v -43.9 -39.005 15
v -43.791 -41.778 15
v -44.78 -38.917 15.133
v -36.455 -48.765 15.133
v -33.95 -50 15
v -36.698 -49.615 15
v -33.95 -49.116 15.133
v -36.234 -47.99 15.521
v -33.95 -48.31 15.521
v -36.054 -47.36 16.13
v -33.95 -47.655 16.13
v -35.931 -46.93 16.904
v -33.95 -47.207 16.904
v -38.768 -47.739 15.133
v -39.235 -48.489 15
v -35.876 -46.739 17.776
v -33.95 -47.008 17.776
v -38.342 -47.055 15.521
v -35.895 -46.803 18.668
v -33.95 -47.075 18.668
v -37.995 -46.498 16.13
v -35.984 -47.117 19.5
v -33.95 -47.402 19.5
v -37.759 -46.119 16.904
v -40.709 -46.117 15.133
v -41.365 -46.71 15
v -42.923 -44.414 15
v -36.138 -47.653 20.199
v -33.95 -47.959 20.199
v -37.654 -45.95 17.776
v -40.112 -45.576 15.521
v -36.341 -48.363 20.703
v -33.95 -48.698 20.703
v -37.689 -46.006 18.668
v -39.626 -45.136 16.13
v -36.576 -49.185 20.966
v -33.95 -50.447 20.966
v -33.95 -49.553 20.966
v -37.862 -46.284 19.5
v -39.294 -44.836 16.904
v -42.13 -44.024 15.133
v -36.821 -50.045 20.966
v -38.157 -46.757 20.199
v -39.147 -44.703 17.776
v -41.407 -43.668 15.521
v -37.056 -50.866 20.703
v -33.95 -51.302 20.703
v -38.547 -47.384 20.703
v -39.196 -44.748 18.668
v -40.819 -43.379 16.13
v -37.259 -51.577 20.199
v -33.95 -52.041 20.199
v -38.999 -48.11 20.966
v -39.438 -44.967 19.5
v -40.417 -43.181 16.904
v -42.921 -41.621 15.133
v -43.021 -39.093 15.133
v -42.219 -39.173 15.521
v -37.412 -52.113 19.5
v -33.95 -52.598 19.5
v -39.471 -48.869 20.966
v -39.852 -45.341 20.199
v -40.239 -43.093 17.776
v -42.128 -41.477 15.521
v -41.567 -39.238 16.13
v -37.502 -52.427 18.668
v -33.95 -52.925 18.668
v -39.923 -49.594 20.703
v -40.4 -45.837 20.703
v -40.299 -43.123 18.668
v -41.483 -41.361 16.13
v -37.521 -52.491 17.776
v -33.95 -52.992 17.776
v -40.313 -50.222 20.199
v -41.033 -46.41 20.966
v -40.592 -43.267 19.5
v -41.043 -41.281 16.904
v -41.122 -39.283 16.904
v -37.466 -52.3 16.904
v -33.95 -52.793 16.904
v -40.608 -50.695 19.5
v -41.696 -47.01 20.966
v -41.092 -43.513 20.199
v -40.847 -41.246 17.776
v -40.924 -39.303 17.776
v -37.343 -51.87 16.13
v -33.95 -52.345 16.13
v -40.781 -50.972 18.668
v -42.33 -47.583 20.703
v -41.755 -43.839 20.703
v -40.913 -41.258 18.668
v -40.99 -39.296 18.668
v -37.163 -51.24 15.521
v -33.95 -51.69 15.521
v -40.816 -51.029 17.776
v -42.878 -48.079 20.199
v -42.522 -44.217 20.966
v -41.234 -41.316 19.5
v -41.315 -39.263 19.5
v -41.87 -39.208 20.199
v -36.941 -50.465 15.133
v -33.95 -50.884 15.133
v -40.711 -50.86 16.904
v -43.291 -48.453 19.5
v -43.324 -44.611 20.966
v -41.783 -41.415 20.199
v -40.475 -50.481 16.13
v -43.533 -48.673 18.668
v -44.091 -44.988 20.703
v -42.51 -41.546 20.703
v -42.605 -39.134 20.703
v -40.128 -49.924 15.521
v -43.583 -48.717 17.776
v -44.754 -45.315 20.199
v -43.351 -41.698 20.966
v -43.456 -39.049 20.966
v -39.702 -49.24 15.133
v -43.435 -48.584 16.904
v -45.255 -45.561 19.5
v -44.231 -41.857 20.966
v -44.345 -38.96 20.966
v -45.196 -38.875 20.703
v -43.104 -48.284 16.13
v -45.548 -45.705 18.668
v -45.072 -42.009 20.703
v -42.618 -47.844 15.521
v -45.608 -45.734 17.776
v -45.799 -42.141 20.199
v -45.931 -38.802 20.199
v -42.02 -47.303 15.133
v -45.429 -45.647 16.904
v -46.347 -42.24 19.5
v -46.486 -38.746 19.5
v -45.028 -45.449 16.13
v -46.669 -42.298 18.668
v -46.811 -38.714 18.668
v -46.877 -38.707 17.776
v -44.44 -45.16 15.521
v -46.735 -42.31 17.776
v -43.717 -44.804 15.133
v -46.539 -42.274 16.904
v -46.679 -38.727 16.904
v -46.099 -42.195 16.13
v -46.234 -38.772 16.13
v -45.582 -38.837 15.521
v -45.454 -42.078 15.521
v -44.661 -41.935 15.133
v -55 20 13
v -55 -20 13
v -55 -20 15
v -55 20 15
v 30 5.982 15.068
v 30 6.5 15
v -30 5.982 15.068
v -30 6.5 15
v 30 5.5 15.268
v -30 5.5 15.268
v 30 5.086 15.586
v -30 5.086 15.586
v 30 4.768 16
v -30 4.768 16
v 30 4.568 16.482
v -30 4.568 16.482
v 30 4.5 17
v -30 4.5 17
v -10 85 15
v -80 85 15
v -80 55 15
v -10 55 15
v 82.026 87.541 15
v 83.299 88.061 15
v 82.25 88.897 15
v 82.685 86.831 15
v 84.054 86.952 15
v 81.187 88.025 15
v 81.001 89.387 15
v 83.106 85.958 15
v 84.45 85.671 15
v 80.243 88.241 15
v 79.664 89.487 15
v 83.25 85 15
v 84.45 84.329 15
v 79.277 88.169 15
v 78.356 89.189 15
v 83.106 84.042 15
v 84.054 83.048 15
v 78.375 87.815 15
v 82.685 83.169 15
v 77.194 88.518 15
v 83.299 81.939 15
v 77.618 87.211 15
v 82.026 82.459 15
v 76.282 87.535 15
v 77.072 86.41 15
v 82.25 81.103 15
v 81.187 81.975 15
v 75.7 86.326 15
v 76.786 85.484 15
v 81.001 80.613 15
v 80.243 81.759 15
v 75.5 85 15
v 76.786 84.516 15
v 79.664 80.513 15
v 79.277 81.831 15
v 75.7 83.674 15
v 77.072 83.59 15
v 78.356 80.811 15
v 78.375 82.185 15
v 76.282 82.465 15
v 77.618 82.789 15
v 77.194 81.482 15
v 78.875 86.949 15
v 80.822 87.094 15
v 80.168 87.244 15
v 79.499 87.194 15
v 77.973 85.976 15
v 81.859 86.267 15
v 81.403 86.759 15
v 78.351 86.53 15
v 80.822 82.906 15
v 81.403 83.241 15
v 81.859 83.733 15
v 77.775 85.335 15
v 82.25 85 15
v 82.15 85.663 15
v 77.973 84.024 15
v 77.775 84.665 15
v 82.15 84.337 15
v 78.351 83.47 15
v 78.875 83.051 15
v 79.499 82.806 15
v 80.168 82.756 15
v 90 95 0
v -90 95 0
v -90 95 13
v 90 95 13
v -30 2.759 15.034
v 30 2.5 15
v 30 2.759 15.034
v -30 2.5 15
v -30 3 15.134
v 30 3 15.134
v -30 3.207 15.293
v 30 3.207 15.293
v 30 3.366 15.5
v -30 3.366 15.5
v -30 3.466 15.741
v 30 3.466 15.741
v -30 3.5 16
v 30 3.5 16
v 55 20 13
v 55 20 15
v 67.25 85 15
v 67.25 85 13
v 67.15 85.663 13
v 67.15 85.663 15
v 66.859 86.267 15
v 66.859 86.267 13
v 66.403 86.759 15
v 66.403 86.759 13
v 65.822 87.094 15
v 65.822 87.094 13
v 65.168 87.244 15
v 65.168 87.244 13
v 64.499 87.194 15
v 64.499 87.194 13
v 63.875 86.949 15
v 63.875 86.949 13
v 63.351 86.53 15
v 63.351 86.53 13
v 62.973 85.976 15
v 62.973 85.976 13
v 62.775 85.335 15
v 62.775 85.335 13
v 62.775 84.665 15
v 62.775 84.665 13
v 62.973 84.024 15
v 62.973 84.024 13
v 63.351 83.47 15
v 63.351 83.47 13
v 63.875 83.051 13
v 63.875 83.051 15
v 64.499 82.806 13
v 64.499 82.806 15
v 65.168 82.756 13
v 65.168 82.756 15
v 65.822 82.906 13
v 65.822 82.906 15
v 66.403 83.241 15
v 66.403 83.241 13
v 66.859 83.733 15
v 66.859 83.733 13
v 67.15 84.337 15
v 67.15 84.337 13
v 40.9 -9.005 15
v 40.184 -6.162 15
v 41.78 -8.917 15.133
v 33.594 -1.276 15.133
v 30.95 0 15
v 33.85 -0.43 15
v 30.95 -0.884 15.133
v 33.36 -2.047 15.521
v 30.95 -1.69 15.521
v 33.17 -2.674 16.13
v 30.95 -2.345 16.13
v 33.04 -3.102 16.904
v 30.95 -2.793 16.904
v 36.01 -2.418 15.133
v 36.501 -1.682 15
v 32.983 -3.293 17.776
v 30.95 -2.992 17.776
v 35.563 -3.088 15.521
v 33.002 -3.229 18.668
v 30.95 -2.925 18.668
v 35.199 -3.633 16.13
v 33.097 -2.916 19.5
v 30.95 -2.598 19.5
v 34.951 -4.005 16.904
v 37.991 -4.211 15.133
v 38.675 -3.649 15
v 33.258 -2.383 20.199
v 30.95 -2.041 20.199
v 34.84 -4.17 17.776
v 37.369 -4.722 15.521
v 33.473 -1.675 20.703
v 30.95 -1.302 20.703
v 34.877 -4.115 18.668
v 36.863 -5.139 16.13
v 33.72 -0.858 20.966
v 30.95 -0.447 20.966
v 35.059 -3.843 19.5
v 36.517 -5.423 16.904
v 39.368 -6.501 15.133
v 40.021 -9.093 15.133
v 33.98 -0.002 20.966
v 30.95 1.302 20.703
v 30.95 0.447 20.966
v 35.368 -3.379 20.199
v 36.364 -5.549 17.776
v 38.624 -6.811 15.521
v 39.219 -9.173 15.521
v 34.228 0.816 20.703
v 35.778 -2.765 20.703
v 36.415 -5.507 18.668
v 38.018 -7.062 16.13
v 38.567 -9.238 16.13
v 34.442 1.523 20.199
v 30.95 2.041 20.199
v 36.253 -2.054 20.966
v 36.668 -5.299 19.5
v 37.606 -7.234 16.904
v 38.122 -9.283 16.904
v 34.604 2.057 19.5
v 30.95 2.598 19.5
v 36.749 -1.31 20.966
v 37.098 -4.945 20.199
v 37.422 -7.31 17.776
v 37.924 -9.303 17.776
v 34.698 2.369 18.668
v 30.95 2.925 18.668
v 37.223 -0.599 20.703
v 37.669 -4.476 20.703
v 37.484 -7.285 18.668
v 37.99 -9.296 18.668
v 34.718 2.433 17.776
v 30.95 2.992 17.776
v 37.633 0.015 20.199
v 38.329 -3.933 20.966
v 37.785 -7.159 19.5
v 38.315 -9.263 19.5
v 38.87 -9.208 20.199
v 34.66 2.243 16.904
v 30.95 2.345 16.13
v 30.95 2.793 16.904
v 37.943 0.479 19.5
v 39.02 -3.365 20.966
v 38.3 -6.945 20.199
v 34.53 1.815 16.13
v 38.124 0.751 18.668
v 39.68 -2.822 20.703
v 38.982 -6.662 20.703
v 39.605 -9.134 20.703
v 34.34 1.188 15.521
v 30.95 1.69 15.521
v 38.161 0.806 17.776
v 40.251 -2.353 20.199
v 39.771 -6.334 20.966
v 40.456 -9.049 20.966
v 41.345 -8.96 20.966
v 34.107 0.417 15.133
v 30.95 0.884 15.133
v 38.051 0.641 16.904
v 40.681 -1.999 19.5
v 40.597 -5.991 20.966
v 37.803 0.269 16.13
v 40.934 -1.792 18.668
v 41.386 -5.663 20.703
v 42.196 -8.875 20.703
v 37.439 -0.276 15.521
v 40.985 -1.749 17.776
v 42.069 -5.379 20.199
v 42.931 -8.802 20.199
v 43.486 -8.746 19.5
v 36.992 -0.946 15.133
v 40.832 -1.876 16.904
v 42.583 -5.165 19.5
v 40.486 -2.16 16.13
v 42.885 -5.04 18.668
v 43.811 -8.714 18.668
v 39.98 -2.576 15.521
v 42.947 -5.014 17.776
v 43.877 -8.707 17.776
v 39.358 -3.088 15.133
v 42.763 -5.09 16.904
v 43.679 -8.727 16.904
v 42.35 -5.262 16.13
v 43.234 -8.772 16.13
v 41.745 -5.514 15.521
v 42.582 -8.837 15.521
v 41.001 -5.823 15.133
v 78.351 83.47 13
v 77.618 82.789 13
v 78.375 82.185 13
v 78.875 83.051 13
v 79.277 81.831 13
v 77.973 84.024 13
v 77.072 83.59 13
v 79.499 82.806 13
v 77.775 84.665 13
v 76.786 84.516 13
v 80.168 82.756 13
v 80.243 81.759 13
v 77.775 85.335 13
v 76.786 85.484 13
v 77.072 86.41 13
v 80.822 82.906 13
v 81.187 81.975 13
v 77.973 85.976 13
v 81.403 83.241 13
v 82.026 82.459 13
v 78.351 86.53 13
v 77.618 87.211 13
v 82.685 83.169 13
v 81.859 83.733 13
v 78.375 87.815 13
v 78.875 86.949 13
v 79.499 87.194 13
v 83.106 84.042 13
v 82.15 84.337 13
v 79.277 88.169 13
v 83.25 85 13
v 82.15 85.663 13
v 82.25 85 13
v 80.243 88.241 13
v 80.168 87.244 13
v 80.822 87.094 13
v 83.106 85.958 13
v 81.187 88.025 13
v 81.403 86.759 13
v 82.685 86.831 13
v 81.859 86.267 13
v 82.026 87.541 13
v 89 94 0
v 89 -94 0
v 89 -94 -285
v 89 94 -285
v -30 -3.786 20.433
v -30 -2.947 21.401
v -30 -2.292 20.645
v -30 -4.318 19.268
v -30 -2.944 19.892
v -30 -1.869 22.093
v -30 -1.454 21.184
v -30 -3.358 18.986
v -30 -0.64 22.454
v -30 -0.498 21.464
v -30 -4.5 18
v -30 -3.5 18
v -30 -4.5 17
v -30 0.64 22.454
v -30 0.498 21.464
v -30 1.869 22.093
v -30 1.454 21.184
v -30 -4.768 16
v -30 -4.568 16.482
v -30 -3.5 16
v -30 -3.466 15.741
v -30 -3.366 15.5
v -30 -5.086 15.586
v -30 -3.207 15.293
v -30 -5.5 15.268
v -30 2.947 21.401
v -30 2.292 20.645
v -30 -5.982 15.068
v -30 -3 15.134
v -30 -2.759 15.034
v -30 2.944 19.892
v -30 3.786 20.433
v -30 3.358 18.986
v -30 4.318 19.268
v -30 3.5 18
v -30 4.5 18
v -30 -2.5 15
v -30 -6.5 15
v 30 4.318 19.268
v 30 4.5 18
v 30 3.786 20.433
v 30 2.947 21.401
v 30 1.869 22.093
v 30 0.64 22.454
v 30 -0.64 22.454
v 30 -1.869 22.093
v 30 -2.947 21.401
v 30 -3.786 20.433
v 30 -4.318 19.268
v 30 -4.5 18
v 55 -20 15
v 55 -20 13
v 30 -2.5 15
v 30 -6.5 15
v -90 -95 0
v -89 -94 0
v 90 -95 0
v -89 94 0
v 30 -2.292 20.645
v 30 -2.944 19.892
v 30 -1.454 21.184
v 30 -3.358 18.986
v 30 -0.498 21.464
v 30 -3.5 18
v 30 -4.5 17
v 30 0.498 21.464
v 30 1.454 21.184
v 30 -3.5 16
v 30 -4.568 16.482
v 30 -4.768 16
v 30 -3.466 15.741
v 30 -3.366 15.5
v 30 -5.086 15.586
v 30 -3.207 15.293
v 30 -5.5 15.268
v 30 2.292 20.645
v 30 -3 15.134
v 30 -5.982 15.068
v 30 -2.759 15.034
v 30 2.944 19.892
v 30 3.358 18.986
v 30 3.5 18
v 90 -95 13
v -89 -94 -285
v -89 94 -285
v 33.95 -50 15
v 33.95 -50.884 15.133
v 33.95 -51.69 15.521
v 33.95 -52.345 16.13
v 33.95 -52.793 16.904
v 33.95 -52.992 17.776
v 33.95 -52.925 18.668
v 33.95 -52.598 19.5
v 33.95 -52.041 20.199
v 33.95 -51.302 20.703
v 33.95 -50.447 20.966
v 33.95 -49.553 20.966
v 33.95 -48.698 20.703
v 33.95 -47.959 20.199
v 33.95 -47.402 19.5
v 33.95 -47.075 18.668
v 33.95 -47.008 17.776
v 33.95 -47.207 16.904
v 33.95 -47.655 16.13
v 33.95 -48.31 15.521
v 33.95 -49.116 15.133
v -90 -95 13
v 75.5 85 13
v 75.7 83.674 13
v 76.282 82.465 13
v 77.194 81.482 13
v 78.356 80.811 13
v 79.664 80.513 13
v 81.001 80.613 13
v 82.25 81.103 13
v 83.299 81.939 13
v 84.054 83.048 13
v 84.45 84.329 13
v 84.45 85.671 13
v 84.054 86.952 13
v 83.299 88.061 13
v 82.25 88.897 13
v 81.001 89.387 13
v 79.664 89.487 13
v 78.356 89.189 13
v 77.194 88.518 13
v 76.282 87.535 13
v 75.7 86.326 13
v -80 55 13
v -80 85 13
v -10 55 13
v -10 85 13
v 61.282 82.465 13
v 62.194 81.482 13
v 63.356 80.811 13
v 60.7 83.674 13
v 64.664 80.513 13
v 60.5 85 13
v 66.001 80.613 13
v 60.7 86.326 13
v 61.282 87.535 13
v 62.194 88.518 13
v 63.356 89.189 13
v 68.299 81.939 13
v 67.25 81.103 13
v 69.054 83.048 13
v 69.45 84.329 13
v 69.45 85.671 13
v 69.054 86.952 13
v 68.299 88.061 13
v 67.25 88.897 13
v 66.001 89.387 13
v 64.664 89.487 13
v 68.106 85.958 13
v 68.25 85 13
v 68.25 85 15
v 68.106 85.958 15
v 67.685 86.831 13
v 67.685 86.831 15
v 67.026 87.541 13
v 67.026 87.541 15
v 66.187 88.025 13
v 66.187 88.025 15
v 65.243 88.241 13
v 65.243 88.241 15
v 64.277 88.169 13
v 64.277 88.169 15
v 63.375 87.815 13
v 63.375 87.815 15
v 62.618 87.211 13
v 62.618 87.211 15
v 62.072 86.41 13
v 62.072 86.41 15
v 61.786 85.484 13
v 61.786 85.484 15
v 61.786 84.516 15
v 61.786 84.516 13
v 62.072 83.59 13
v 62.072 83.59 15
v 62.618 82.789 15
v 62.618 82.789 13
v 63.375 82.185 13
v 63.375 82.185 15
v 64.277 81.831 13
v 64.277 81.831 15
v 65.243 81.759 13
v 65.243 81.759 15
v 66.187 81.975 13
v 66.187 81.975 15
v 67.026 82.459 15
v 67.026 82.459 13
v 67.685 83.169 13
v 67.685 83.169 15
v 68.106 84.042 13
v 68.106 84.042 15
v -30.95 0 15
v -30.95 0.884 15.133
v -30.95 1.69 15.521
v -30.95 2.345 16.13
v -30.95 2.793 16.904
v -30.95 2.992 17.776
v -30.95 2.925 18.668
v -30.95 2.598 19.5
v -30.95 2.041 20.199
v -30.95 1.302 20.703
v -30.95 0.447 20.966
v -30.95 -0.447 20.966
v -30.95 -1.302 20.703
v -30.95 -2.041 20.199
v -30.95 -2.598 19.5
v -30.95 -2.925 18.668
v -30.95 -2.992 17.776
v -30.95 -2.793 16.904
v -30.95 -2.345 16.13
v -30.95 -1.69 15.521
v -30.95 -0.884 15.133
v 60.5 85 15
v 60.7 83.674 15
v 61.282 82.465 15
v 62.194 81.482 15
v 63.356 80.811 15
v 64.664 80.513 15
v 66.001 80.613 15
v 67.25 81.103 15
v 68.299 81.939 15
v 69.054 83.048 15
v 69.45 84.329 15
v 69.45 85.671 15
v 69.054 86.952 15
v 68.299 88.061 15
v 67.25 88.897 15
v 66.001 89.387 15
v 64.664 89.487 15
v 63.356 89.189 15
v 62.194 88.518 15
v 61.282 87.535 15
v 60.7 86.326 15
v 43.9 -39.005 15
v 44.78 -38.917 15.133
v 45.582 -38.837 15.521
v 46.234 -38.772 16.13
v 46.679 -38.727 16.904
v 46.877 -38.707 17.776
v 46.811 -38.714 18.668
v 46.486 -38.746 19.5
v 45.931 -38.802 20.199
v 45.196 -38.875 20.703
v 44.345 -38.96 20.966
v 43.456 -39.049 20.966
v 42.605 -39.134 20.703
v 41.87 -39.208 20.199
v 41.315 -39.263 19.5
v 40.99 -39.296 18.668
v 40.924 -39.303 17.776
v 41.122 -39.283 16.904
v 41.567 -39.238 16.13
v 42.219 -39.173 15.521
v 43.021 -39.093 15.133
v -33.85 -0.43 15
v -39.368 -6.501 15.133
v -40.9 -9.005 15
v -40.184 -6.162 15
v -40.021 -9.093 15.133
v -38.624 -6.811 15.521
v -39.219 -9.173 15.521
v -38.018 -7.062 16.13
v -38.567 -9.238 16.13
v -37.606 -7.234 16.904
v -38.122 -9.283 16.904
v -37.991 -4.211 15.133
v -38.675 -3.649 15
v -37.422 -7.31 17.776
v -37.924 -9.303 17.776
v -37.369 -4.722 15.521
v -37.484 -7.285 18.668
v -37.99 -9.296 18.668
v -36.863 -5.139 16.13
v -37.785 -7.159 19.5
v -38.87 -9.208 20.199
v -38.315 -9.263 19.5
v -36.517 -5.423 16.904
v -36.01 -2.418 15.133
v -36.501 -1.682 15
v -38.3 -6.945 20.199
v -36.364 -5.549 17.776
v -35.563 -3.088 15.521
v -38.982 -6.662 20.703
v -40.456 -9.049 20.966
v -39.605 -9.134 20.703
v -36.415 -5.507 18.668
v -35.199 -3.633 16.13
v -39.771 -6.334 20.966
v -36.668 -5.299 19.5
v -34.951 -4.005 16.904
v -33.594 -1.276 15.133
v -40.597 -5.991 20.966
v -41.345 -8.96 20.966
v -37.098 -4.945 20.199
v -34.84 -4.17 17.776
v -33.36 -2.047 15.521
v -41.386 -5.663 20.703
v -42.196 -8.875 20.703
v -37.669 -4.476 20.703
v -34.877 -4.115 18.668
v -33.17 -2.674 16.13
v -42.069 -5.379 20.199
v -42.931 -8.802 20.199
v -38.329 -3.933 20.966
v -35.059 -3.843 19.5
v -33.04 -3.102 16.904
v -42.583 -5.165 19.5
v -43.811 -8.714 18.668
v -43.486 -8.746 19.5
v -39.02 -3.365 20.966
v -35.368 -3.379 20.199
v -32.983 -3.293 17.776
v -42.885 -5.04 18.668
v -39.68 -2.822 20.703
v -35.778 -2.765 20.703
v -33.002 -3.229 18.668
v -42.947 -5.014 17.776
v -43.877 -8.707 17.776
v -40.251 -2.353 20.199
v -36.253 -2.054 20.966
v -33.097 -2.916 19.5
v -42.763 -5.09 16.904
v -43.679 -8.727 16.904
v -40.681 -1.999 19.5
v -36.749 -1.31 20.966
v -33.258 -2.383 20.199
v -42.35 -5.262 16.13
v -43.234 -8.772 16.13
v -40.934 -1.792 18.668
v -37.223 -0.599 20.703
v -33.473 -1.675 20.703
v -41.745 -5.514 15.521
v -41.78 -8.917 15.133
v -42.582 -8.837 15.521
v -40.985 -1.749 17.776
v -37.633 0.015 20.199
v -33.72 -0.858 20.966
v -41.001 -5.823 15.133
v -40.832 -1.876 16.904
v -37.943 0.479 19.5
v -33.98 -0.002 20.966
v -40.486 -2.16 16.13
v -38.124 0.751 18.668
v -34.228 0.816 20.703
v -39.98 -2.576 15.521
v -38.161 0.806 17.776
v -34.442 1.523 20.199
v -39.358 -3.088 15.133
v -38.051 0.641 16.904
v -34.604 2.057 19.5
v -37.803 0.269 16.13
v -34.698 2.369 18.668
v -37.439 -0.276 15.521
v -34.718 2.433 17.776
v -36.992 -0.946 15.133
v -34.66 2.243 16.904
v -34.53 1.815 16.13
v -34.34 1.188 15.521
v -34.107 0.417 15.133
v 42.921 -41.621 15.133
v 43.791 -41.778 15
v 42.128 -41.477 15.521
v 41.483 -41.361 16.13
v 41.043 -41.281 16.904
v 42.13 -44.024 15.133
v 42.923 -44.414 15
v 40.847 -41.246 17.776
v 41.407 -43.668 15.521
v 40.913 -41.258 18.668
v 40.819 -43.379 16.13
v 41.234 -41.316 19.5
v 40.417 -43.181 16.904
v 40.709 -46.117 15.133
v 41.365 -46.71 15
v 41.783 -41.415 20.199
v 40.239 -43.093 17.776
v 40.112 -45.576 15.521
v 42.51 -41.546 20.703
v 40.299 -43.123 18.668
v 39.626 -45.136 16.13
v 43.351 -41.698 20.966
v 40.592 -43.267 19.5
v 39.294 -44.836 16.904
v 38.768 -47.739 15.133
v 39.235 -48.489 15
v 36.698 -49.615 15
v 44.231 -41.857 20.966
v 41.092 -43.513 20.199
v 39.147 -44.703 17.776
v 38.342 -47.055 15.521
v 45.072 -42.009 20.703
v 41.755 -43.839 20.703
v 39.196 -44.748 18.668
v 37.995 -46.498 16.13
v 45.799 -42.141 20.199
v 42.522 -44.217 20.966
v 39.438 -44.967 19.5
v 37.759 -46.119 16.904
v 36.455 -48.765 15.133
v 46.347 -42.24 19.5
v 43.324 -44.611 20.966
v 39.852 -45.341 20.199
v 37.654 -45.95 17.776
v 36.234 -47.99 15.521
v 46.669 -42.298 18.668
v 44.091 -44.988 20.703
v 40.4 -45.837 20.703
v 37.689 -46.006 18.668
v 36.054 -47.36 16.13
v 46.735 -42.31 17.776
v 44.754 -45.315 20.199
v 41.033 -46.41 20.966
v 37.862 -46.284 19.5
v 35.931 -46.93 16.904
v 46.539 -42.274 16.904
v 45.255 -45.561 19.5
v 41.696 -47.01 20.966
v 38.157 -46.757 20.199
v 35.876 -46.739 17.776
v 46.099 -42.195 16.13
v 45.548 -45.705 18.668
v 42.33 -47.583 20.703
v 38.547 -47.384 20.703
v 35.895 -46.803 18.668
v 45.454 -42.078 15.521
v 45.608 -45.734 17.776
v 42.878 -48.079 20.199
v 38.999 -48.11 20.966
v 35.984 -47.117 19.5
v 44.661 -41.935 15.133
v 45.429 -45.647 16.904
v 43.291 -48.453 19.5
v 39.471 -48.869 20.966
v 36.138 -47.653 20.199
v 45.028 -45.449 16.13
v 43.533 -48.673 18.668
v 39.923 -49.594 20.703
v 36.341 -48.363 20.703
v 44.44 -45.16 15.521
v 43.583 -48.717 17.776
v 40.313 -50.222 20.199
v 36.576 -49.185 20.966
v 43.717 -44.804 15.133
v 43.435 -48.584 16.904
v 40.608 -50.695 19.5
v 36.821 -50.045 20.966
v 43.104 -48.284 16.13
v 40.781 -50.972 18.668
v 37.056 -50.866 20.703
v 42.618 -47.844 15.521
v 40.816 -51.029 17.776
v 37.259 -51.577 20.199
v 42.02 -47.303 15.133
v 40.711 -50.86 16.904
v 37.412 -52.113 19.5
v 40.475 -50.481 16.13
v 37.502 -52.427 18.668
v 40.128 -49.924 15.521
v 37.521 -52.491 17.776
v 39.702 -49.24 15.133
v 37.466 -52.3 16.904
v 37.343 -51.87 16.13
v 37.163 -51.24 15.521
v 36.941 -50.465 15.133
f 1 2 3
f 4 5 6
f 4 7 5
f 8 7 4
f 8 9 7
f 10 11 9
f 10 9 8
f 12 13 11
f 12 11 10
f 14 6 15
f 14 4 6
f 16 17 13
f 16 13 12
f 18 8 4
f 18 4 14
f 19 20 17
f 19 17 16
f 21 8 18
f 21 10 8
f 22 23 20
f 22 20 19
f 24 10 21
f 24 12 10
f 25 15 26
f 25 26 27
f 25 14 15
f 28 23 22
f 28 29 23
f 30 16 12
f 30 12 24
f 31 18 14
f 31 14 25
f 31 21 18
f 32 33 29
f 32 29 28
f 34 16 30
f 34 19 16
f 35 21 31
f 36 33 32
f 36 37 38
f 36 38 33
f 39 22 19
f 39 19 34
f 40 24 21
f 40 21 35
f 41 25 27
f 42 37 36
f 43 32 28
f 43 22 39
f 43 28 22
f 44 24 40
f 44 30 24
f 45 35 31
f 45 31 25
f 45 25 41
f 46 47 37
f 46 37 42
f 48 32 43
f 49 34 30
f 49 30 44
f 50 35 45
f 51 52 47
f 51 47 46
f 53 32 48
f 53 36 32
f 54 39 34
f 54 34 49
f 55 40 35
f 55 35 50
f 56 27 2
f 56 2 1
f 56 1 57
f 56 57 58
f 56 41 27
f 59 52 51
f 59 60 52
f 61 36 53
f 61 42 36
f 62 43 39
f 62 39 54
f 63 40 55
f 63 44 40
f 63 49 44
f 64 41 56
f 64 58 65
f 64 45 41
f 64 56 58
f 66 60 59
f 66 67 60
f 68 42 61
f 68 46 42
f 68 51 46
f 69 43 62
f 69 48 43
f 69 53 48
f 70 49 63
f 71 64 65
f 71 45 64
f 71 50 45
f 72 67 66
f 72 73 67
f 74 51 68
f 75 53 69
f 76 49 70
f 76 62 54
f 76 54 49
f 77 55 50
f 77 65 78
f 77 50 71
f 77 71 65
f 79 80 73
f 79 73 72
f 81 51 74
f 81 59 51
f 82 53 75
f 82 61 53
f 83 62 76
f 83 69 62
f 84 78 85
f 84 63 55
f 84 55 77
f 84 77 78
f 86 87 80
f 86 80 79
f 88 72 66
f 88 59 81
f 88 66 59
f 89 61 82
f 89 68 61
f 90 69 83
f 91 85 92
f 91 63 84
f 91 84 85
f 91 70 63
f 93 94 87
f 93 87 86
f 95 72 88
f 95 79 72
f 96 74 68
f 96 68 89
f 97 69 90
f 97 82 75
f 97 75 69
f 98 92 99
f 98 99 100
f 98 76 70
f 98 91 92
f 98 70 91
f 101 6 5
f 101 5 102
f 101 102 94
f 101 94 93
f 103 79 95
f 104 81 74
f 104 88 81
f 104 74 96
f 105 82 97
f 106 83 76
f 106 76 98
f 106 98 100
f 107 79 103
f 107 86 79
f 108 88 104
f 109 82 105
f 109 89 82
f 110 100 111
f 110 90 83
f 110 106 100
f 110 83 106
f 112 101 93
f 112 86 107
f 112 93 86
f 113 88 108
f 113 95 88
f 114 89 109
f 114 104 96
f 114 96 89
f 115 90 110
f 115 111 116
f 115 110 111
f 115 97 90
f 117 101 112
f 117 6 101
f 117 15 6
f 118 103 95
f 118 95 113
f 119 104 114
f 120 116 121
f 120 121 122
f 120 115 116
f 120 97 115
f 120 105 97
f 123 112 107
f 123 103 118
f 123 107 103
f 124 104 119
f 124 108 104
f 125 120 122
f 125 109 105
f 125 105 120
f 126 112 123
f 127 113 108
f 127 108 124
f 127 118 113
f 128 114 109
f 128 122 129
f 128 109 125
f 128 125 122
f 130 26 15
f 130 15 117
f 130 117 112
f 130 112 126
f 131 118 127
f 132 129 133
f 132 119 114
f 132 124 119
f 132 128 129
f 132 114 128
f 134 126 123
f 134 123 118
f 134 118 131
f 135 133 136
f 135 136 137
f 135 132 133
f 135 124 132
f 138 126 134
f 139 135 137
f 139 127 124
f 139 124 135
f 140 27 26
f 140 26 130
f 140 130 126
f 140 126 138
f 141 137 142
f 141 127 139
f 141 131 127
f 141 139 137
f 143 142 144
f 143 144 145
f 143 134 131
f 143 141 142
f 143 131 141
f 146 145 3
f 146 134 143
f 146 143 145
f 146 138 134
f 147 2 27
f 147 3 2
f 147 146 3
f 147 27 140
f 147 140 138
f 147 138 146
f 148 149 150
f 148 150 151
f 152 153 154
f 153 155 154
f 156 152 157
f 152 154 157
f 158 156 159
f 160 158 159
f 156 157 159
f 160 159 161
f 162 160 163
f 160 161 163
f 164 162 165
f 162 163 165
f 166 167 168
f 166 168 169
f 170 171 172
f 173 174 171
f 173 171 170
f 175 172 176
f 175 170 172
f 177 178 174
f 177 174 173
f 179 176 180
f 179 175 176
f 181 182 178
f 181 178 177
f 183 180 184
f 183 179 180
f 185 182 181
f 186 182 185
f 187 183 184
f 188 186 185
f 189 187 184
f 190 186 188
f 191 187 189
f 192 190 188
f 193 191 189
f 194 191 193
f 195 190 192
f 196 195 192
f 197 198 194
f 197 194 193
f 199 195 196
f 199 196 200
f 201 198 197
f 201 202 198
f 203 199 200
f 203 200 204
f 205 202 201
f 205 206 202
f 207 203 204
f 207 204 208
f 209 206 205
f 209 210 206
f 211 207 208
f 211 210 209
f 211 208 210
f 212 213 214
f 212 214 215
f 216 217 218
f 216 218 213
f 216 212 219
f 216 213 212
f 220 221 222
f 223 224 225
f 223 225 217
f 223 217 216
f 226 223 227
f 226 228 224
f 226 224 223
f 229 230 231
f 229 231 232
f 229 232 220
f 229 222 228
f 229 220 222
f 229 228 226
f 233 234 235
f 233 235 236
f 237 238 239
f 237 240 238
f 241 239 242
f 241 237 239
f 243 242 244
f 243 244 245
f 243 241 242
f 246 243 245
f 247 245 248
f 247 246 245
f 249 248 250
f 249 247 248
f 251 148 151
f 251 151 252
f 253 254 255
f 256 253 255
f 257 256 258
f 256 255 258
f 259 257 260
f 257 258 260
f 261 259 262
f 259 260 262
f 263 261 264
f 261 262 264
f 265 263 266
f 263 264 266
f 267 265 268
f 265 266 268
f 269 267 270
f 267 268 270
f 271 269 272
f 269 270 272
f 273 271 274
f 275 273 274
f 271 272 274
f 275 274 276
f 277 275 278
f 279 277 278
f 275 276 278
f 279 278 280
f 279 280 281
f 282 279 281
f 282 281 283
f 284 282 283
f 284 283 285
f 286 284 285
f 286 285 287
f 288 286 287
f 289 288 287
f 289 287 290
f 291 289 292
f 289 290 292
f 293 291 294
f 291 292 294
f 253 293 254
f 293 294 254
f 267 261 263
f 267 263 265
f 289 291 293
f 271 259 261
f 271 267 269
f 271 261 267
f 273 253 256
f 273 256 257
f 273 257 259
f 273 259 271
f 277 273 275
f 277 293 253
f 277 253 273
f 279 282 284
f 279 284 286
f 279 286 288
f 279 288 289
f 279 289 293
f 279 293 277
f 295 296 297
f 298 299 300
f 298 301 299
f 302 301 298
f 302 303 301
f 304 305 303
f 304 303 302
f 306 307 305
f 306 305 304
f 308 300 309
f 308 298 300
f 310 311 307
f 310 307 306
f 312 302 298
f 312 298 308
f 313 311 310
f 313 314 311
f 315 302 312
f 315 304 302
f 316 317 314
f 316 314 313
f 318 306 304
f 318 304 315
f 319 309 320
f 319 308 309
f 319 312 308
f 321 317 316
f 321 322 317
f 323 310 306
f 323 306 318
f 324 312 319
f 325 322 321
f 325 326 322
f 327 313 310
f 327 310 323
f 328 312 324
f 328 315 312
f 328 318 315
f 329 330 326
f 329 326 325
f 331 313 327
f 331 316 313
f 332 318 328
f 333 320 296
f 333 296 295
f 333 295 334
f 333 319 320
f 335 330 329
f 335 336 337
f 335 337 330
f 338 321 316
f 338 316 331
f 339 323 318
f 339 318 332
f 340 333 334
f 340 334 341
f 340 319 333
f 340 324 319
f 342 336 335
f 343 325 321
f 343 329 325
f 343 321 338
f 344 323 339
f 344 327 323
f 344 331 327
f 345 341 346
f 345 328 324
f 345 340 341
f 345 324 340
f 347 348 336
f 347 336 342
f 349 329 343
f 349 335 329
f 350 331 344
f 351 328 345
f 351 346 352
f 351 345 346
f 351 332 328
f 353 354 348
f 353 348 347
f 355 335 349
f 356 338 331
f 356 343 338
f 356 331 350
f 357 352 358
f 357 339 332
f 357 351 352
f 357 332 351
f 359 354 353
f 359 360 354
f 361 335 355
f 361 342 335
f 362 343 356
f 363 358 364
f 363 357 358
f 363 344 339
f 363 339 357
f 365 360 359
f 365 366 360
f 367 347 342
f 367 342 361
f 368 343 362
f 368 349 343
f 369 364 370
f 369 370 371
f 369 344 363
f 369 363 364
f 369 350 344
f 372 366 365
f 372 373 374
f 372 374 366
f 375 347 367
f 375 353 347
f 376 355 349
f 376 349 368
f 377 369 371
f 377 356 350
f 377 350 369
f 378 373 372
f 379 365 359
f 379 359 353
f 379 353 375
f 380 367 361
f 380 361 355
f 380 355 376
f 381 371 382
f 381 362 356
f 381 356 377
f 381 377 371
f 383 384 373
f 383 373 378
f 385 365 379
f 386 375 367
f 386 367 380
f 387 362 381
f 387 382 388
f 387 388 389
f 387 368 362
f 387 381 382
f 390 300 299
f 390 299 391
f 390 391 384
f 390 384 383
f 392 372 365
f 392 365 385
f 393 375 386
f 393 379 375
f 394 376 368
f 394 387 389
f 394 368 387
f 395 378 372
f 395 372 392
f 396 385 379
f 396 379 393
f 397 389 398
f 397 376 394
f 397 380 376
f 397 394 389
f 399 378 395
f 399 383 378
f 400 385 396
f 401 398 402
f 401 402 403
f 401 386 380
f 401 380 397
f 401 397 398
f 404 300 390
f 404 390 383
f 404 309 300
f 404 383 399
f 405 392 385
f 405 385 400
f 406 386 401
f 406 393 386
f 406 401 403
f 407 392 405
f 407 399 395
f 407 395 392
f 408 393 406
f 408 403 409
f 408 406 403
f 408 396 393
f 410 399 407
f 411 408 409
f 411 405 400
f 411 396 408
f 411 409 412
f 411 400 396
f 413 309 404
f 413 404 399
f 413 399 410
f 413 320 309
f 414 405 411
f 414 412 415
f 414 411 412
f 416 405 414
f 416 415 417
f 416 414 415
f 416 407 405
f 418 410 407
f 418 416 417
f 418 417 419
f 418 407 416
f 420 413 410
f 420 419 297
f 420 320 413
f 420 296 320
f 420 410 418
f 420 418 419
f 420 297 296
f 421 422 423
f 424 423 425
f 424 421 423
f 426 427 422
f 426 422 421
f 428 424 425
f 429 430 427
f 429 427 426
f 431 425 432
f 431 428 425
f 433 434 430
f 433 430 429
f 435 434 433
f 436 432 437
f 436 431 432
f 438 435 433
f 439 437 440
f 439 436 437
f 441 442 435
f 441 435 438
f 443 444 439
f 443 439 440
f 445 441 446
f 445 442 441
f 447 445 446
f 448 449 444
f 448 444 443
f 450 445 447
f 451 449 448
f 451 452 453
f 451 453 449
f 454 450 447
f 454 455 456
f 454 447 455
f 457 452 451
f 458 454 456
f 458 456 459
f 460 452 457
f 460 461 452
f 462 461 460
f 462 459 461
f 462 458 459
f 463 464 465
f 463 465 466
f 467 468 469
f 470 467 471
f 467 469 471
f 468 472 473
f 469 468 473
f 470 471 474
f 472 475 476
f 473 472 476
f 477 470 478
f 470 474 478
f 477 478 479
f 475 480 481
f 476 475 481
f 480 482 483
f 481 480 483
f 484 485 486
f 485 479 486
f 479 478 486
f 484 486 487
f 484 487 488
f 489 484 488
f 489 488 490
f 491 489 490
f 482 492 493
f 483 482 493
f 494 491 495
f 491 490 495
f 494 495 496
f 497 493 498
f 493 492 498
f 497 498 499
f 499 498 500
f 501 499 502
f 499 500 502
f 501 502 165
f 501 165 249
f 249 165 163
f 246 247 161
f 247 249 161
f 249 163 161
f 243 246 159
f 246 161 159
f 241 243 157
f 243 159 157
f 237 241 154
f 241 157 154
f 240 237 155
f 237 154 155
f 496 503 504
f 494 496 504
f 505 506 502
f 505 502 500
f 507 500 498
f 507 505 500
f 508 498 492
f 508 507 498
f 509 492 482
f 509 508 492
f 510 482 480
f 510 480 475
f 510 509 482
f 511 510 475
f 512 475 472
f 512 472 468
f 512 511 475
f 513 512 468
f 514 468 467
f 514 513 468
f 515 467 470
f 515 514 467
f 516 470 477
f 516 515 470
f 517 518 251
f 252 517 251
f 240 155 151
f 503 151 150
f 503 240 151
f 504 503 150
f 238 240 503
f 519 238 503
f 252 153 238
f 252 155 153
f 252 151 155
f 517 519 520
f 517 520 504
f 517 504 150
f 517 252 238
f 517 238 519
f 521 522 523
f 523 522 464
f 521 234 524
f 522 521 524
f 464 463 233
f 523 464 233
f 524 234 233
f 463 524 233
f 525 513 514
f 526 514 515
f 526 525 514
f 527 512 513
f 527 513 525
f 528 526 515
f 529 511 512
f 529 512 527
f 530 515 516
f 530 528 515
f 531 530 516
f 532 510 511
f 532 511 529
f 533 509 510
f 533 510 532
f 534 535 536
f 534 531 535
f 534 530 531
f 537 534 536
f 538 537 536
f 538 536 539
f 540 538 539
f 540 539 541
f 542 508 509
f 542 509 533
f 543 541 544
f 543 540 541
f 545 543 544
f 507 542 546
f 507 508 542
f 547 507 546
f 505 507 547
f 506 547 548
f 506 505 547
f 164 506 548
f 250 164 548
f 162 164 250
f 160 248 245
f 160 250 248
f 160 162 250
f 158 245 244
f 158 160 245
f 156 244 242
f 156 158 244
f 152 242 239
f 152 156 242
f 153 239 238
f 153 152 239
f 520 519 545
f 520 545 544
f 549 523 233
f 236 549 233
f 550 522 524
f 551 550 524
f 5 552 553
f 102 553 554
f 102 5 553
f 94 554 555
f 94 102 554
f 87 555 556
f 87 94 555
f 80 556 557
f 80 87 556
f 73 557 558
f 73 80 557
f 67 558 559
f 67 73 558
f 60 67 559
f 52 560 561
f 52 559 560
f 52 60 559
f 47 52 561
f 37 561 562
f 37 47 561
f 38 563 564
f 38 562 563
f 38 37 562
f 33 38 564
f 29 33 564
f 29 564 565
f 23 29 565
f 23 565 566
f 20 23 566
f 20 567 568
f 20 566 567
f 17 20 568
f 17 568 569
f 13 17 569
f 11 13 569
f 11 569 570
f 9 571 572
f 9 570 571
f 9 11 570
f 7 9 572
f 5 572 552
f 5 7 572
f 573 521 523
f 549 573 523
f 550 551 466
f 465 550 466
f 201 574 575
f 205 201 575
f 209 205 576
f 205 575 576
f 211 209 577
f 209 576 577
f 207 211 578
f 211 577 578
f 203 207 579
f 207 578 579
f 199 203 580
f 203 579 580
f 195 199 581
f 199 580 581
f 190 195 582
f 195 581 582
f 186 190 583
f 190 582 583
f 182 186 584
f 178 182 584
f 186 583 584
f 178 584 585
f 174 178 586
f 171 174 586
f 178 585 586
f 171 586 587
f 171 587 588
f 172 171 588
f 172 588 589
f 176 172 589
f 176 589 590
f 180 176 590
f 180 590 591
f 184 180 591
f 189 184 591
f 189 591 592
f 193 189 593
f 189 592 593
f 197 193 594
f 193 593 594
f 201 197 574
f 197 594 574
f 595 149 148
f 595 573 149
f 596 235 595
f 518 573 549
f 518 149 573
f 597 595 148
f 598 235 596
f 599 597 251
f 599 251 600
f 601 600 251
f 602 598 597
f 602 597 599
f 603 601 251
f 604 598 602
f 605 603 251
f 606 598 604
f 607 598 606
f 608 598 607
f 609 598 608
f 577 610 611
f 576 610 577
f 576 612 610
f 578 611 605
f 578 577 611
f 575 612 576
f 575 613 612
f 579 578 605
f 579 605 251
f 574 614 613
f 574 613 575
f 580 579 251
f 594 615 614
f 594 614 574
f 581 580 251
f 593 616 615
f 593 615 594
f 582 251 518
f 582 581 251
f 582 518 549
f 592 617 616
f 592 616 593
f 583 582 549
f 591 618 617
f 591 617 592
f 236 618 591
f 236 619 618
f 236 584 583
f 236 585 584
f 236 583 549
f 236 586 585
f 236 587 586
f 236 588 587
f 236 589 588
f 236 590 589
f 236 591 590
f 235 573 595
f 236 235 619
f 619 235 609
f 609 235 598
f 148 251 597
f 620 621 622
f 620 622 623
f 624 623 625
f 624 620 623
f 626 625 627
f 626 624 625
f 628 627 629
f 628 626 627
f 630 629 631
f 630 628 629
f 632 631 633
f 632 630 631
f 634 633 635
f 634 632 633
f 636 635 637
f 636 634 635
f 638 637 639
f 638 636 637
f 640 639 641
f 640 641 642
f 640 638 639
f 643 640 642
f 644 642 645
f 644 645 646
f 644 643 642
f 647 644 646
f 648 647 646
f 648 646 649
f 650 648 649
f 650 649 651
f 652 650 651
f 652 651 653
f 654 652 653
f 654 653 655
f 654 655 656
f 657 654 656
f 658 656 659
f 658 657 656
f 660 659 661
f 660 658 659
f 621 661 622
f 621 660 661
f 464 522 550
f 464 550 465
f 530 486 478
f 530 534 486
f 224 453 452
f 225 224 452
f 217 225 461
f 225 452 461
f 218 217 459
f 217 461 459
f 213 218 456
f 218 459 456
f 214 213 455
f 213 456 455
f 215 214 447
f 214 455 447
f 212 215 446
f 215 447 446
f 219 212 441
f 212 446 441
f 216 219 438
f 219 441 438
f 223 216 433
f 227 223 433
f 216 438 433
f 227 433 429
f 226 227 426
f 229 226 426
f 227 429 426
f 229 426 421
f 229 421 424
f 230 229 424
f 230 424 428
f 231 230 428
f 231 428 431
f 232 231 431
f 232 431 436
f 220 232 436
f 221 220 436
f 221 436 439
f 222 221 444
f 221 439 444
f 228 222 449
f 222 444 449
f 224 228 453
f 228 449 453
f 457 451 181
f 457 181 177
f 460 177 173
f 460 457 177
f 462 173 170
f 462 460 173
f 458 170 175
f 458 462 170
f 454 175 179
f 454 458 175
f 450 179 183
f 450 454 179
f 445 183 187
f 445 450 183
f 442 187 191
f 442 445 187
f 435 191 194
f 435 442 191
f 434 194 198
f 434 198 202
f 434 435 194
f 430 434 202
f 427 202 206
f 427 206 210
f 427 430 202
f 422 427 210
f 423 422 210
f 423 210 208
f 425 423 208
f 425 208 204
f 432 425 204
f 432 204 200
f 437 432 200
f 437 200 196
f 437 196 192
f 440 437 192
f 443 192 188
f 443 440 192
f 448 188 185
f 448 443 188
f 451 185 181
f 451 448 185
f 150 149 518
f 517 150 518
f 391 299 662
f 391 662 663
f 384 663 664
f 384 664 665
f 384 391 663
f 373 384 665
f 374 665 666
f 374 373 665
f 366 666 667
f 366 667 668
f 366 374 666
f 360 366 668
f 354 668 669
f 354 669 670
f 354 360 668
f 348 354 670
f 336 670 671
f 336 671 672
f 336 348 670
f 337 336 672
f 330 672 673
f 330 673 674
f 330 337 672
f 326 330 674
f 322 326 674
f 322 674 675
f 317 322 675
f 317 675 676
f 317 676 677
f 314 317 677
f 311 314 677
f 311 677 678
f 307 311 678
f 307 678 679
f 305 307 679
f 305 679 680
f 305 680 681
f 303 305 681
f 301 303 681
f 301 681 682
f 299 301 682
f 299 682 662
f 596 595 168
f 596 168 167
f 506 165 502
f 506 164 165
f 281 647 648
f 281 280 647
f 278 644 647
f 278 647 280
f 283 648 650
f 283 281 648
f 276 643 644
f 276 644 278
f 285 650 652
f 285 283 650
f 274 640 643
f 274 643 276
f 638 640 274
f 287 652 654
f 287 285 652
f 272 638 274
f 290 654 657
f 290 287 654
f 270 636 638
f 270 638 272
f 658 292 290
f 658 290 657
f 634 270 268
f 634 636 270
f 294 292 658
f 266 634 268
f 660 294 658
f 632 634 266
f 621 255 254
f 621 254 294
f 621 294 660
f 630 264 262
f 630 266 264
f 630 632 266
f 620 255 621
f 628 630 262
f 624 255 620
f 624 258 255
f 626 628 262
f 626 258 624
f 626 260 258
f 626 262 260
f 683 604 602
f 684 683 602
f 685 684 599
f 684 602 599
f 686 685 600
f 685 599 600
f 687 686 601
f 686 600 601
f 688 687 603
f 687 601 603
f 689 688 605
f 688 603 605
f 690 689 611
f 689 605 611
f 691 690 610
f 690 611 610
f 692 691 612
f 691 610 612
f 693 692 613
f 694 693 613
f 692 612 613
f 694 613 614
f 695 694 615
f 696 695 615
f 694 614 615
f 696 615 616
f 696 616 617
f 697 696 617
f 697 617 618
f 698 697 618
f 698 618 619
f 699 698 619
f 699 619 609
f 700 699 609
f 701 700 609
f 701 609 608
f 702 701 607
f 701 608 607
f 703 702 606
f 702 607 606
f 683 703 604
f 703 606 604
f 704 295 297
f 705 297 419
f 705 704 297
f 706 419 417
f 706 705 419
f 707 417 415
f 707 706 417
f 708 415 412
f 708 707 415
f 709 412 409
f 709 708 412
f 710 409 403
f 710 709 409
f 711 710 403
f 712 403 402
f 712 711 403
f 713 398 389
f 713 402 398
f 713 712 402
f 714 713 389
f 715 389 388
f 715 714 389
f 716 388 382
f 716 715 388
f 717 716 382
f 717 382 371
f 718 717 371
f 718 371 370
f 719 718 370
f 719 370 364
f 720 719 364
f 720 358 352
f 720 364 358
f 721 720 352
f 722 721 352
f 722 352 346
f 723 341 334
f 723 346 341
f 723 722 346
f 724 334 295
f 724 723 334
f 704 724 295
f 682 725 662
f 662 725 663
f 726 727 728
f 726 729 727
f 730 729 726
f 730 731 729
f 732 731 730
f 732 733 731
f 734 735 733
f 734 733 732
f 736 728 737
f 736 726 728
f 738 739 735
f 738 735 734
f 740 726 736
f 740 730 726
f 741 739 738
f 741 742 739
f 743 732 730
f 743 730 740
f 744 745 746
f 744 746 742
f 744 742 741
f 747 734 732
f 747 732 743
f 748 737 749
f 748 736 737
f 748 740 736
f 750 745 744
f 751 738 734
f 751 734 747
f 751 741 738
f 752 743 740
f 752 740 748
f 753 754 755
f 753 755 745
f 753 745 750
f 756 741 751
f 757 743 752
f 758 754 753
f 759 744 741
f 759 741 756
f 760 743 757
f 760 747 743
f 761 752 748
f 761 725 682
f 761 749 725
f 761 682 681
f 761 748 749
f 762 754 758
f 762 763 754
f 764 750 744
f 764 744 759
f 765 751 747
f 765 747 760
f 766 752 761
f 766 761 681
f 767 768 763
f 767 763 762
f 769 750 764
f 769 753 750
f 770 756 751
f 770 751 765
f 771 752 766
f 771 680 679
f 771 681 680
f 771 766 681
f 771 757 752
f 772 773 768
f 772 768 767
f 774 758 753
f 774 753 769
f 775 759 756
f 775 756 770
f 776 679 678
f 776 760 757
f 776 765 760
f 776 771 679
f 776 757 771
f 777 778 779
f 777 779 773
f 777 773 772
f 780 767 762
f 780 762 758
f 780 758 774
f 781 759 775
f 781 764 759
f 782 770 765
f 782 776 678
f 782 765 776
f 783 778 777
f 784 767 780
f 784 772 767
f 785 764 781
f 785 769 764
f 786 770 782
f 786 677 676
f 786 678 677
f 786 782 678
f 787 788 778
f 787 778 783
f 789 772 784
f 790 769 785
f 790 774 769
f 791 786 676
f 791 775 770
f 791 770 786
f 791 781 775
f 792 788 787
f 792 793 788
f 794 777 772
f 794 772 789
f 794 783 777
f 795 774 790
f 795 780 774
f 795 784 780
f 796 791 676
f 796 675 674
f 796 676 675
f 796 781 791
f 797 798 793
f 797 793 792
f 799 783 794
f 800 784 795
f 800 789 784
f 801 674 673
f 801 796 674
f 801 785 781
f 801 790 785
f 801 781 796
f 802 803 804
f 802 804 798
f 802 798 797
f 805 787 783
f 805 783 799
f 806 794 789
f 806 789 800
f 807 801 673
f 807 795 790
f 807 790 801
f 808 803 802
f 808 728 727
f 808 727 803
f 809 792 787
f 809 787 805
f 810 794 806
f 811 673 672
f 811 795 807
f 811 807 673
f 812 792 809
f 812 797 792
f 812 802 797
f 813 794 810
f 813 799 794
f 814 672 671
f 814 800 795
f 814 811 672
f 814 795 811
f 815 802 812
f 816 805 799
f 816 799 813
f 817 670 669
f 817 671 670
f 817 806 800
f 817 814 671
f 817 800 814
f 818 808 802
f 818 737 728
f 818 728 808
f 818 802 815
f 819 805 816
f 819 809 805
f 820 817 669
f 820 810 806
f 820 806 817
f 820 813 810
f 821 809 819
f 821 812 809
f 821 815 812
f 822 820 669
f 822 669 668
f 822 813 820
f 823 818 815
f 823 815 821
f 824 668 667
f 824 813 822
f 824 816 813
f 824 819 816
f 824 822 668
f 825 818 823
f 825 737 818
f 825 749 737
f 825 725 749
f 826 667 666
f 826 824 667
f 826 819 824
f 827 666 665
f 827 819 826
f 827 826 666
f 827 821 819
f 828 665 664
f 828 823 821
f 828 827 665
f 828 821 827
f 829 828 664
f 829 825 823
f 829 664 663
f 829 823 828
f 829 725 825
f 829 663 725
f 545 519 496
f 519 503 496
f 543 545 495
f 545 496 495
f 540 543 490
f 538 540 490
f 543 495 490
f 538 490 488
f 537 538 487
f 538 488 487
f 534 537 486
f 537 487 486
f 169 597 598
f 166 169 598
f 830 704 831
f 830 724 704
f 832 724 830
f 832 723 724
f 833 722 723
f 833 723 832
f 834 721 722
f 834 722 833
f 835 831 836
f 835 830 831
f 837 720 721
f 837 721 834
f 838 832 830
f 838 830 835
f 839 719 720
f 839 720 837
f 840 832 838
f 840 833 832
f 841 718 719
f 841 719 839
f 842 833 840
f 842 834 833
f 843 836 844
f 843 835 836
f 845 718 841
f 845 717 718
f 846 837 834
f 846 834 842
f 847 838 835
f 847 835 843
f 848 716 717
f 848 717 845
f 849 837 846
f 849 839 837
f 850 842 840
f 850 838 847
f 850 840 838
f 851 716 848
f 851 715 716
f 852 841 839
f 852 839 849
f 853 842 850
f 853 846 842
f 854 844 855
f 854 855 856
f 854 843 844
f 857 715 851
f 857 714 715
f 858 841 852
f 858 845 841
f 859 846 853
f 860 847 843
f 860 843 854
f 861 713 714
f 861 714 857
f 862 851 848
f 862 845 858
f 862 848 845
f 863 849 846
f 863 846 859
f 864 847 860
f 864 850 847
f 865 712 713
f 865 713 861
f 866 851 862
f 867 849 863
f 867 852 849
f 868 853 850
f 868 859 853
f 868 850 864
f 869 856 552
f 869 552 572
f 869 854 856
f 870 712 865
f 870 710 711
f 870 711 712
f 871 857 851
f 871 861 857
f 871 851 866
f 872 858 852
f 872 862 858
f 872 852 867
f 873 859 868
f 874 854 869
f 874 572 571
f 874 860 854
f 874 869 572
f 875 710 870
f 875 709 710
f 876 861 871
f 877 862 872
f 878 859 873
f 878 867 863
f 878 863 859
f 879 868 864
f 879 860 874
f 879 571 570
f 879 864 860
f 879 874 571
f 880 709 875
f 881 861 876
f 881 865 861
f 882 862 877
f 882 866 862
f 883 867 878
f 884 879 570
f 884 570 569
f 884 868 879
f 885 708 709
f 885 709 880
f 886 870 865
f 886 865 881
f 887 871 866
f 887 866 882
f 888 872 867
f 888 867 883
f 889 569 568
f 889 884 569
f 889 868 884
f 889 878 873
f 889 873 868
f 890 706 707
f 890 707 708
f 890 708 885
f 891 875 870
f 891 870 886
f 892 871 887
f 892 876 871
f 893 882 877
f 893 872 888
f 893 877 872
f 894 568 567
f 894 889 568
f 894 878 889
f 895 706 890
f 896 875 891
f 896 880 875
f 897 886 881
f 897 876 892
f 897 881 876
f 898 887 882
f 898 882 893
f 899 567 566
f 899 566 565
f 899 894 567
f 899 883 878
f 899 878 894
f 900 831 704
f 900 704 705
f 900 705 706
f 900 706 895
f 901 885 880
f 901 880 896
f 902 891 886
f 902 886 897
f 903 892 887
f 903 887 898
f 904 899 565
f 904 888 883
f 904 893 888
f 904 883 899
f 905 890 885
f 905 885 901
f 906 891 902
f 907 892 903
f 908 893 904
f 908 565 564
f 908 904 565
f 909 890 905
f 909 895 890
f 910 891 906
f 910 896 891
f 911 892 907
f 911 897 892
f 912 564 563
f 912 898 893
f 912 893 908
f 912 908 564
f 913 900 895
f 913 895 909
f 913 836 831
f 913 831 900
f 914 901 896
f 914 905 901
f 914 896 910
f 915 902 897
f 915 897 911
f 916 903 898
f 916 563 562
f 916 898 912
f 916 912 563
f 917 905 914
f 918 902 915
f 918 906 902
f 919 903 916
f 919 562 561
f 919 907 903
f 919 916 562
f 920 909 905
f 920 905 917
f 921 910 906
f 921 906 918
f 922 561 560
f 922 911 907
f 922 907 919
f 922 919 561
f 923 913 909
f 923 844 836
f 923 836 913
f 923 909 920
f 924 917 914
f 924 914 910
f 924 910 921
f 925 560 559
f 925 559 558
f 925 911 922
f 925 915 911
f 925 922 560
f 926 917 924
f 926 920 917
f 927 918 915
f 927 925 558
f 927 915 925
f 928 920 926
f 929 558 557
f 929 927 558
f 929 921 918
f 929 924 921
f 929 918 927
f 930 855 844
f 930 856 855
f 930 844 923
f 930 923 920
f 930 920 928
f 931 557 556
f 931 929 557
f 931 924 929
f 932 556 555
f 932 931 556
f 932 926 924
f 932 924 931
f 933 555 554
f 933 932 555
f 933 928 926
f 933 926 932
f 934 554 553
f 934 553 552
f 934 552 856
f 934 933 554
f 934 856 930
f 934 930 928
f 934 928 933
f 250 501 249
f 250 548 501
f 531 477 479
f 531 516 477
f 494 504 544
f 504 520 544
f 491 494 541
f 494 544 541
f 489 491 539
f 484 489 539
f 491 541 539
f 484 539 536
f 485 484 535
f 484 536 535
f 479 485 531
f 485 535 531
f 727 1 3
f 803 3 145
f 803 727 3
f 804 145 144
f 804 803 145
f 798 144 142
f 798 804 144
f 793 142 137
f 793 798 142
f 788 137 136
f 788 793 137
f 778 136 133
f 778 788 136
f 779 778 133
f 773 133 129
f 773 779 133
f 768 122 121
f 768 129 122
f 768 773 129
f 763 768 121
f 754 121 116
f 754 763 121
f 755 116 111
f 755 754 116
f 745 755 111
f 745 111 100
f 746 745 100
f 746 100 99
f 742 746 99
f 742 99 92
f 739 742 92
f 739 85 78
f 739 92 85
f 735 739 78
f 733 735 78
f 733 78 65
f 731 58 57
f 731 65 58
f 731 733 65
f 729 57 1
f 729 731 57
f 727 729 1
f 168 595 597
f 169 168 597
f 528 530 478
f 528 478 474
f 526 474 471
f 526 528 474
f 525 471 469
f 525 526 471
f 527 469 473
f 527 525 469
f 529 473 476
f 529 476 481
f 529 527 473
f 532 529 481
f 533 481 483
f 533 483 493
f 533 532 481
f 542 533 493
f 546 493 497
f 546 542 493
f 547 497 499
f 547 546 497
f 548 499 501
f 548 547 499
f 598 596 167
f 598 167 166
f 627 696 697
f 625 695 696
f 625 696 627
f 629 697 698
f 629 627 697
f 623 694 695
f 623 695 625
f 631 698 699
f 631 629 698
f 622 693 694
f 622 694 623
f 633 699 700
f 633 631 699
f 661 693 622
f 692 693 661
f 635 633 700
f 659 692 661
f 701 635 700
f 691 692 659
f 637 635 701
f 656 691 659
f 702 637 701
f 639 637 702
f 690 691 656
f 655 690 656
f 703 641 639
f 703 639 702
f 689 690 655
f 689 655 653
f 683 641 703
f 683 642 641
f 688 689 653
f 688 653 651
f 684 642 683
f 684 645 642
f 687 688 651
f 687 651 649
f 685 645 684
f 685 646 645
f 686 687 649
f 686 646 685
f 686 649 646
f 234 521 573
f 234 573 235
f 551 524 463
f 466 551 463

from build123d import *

# Parameters (mm, degrees)
SKETCH_1_W          = 180
SKETCH_1_H          = 190
EXTRUDE_2_DEPTH     = 13
SKETCH_1_4_W        = 178
SKETCH_1_4_H        = 188
EXTRUDE_3_DEPTH     = 285
SKETCH_2_W          = 70
SKETCH_2_H          = 30
SKETCH_2_W_2        = 110
SKETCH_2_H_2        = 40
EXTRUDE_4_DEPTH     = 2
SKETCH_4_R          = 3
SKETCH_13_R         = 4.5
EXTRUDE_5_DEPTH     = 2
SKETCH_13_3_R       = 3.25
SKETCH_13_3_R_2     = 2.25
CUT_EXTRUDE_1_DEPTH = 2
SKETCH_4_8_R        = 3
SKETCH_4_8_R_2      = 2
SKETCH_4_8_W        = 1
SKETCH_4_8_H        = 190
EXTRUDE_1_DEPTH     = 30
FILLET_1_R          = 2
FILLET_2_R          = 1


with BuildPart() as part:
    # 草图1 → 凸台-拉伸2 (new body)
    with BuildSketch(Plane.XY):
        Rectangle(SKETCH_1_W, SKETCH_1_H)
    extrude(amount=EXTRUDE_2_DEPTH)

    # 草图1<4> → 凸台-拉伸3 (add)
    with BuildSketch(Plane.XY):
        Rectangle(SKETCH_1_4_W, SKETCH_1_4_H)
    extrude(amount=-EXTRUDE_3_DEPTH)

    # 草图2 → 凸台-拉伸4 (add)
    with BuildSketch(Plane.XY.offset(13)):
        with Locations((-45, 70)):
            Rectangle(SKETCH_2_W, SKETCH_2_H)
        Rectangle(SKETCH_2_W_2, SKETCH_2_H_2)
    extrude(amount=EXTRUDE_4_DEPTH)

    # 草图13 → 凸台-拉伸5 (add)
    with BuildSketch(Plane.XY.offset(13)):
        with Locations(Location((65, 85, 0), (0, 0, 180))):
            Circle(SKETCH_13_R)
        with Locations(Location((80, 85, 0), (0, 0, 180))):
            Circle(SKETCH_13_R)
    extrude(amount=EXTRUDE_5_DEPTH)

    # 草图13<3> → 切除-拉伸-薄壁1 (cut)
    # profile 1 of 2: a face of its own
    with BuildSketch(Plane.XY.offset(13)):
        with Locations((80, 85)):
            Circle(SKETCH_13_3_R)
        with Locations((80, 85)):
            Circle(SKETCH_13_3_R_2, mode=Mode.SUBTRACT)
    # profile 2 of 2: a face of its own
    with BuildSketch(Plane.XY.offset(13)):
        with Locations((65, 85)):
            Circle(SKETCH_13_3_R)
        with Locations((65, 85)):
            Circle(SKETCH_13_3_R_2, mode=Mode.SUBTRACT)
    extrude(amount=CUT_EXTRUDE_1_DEPTH, mode=Mode.SUBTRACT)

    # 草图4<8> → 拉伸-薄壁1 (add, symmetric)
    # profile 1 of 4: a face of its own
    with BuildSketch(Plane(origin=(0, 0, 0), x_dir=(0, 0, -1), z_dir=(1, 0, 0))):
        with Locations((-18, 0)):
            Circle(SKETCH_4_8_R)
        with Locations((-18, 0)):
            Circle(SKETCH_4_8_R_2, mode=Mode.SUBTRACT)
    # profile 2 of 4: a face of its own
    with BuildSketch(Plane(origin=(0, 0, 0), x_dir=(0, 0, -1), z_dir=(1, 0, 0))):
        Polygon((-13, 20), (-15, 20), (-15, -20), (-13, -20), (-13, -19), (-14, -19), (-14, 19), (-13, 19), align=None)
    # profile 3 of 4: a face of its own
    with BuildSketch(Plane(origin=(0, 0, 0), x_dir=(0, 0, -1), z_dir=(1, 0, 0))):
        with Locations((-12.5, 0)):
            Rectangle(SKETCH_4_8_W, SKETCH_4_8_H)
    # profile 4 of 4: a face of its own
    with BuildSketch(Plane(origin=(0, 0, 0), x_dir=(0, 0, -1), z_dir=(1, 0, 0))):
        with BuildLine():
            Line((-15, -3.5), (-18, -3.5))
            ThreePointArc((-18, -3.5), (-21.5, 0), (-18, 3.5))
            Line((-18, 3.5), (-15, 3.5))
            Line((-15, 3.5), (-15, 4.5))
            Line((-15, 4.5), (-18, 4.5))
            ThreePointArc((-18, 4.5), (-22.5, 0), (-18, -4.5))
            Line((-18, -4.5), (-15, -4.5))
            Line((-15, -4.5), (-15, -3.5))
        make_face()
    extrude(amount=EXTRUDE_1_DEPTH, both=True)


with BuildPart() as body_2:
    # 扫描2: sweep along a path in 草图3
    with BuildLine(Plane.XY.offset(15)) as sweep_2_path:
        Line((-30.950124379, 0), (30.950124379, 0))
        ThreePointArc((30.950124379, 0), (37.660177586, -2.585474664), (40.900496281, -9.00496281))
        Line((40.900496281, -9.00496281), (43.900496281, -39.00496281))
        ThreePointArc((43.900496281, -39.00496281), (41.364649714, -46.710053208), (33.950124379, -50))
        Line((33.950124379, -50), (-33.950124379, -50))
        ThreePointArc((-33.950124379, -50), (-41.364649714, -46.710053208), (-43.900496281, -39.00496281))
        Line((-43.900496281, -39.00496281), (-40.900496281, -9.00496281))
        ThreePointArc((-40.900496281, -9.00496281), (-37.660177586, -2.585474664), (-30.950124379, 0))
    # 草图4 → 扫描2 (sweep)
    with BuildSketch(Plane(origin=(0, 0, 0), x_dir=(0, 0, -1), z_dir=(1, 0, 0))):
        with Locations((-18, 0)):
            Circle(SKETCH_4_R)
    sweep(path=sweep_2_path.line)


with BuildPart() as extrude_1_kept_piece:
    # of the separate pieces the step leaves, the one the design keeps (extrude_1_pieces_kept)
    add(part.part.solids().sort_by_distance((90, 95, 0))[0])

    # 圆角1
    fillet_1_edges = [extrude_1_kept_piece.edges().sort_by_distance(p)[0] for p in [
        (0, 4.5, 15),
        (0, -4.5, 15),
    ]]
    fillet(fillet_1_edges, radius=FILLET_1_R)

    # 圆角2
    fillet_2_edges = [extrude_1_kept_piece.edges().sort_by_distance(p)[0] for p in [
        (0, 3.5, 15),
        (0, -3.5, 15),
    ]]
    fillet(fillet_2_edges, radius=FILLET_2_R)


solid = Compound([body_2.part, extrude_1_kept_piece.part])
